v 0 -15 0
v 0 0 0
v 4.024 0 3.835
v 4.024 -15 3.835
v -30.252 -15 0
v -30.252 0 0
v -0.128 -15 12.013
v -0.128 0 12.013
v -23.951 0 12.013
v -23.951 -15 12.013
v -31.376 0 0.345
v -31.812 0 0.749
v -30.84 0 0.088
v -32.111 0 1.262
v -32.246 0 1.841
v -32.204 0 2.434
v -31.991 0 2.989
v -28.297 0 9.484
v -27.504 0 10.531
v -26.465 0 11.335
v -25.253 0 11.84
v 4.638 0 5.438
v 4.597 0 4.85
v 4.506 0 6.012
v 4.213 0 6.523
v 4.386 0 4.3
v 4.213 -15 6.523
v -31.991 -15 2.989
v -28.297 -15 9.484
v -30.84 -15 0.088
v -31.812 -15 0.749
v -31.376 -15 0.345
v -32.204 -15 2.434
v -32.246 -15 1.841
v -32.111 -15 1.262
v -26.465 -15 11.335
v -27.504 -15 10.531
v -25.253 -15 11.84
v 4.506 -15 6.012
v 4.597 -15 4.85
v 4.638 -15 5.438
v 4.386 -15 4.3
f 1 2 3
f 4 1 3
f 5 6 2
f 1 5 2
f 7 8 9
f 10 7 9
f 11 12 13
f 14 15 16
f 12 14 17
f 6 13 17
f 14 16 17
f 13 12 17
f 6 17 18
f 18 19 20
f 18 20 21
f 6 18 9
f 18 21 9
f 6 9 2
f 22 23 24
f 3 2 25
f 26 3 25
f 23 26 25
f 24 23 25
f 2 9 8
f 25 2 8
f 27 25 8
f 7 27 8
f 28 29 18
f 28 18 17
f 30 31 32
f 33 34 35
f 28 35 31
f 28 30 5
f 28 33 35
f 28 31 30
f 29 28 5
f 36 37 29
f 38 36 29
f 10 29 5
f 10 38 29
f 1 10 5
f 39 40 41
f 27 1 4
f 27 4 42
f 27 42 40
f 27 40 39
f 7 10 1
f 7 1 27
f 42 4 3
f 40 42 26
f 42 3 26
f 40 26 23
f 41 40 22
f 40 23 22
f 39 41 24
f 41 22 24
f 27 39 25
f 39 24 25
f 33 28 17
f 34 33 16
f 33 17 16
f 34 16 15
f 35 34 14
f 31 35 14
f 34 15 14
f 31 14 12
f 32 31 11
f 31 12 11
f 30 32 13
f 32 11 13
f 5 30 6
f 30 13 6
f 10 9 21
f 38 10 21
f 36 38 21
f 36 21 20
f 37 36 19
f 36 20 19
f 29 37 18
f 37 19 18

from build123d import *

# Parameters (mm, degrees)
F1_DEPTH = 15


with BuildPart() as f1:
    # F0 (on Front) → F1 (new body)
    with BuildSketch(Plane.XZ):
        with BuildLine():
            ThreePointArc((-31.990636, 2.988535), (-31.980754, 0.994284), (-30.252016, 0))
            Line((-30.252016, 0), (0, 0))
            Line((0, 0), (4.023837, 3.83522))
            ThreePointArc((4.023837, 3.83522), (4.639042, 5.142749), (4.212761, 6.52347))
            Line((4.212761, 6.52347), (-0.127799, 12.012706))
            Line((-0.127799, 12.012706), (-13.884482, 12.012706))
            Line((-13.884482, 12.012706), (-23.950903, 12.012706))
            ThreePointArc((-23.950903, 12.012706), (-26.465193, 11.334552), (-28.297452, 9.484045))
            Line((-28.297452, 9.484045), (-31.990636, 2.988535))
        make_face()
    extrude(amount=F1_DEPTH)


solid = f1.part
